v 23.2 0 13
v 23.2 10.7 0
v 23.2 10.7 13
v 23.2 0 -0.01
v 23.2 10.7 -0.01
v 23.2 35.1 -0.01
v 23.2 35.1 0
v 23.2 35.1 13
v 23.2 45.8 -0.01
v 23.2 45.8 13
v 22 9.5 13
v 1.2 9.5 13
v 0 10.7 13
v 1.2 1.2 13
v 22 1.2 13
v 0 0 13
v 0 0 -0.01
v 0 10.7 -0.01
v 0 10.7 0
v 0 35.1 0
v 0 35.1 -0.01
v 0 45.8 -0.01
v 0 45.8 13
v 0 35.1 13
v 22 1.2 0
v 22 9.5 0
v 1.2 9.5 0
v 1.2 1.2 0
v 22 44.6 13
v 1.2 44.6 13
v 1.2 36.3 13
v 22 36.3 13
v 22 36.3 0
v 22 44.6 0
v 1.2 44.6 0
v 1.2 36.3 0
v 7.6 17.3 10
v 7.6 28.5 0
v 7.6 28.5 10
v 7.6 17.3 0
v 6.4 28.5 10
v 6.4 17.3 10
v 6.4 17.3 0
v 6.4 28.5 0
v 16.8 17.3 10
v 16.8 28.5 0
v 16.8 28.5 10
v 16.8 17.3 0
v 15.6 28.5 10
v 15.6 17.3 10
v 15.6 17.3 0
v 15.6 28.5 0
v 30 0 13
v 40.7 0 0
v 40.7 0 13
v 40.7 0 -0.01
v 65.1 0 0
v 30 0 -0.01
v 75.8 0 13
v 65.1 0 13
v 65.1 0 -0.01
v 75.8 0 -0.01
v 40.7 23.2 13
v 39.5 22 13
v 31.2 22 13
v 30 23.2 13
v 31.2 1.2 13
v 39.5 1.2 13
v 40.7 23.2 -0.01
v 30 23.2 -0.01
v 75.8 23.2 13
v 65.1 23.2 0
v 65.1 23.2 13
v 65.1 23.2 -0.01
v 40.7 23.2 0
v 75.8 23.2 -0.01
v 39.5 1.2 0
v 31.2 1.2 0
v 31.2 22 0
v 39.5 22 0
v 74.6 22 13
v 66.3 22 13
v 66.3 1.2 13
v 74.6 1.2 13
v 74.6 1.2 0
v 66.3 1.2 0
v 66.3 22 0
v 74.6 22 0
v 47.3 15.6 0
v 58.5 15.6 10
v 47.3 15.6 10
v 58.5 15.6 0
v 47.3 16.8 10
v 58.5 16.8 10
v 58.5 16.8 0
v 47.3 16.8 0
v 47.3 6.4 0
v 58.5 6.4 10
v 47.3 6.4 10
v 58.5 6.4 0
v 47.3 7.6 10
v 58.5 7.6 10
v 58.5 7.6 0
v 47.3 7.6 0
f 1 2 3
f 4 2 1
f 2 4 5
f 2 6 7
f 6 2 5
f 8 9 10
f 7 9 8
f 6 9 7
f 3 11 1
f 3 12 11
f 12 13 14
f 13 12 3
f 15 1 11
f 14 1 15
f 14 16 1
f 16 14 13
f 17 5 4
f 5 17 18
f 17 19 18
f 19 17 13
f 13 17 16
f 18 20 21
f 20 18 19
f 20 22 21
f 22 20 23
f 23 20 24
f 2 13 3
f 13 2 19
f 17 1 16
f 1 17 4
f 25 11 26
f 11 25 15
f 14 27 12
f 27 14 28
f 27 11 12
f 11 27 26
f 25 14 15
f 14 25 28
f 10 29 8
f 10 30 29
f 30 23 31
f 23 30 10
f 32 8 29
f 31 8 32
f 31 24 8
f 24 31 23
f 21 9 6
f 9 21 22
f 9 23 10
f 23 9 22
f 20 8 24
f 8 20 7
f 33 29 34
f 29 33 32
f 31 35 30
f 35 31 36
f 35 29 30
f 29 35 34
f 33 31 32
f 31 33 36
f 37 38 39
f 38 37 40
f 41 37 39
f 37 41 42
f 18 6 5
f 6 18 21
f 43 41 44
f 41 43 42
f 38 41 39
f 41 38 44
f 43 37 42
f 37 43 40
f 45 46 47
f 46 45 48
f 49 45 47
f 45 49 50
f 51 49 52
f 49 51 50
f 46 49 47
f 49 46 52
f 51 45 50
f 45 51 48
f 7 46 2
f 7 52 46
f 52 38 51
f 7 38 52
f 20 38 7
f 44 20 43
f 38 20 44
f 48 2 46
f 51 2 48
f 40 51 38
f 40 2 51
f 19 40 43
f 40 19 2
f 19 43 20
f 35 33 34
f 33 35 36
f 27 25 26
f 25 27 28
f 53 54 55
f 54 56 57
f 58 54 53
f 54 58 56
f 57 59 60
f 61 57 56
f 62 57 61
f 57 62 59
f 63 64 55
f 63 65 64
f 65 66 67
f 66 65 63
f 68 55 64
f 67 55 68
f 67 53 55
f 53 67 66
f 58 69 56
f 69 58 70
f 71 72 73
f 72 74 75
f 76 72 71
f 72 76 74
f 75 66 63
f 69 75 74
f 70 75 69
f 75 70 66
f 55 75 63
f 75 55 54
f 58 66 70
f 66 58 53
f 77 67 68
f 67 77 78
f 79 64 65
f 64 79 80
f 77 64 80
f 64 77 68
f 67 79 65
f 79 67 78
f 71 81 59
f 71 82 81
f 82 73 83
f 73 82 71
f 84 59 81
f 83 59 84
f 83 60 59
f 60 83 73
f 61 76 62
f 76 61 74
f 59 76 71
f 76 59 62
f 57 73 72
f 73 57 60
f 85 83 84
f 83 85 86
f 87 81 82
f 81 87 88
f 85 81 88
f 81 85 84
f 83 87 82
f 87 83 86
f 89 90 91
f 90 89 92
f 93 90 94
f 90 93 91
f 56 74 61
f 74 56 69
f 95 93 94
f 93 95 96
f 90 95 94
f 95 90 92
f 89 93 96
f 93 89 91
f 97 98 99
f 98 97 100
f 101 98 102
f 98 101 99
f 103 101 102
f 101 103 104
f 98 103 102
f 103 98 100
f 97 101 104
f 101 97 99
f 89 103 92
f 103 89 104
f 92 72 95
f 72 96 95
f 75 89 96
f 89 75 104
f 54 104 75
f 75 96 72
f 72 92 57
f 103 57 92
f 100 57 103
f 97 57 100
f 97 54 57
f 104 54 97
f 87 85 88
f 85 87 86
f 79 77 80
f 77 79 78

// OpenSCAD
// file: ../../Elements/FrameLockingRing.scad
// Fischertechnik Box Library
// Frame for Locking Ring
// 31020

use <../Base/Constants.scad>
use <../ModelBase/Simple.scad>

width = 20;
depth = 7.5;
height = 13;

// getFrameLockingRingSpace(columns=1, rows=1)
// columns = Count of locking rings in X direction (width of ring)
// rows = Count of locking rings in Y direction (depth of ring)
// Gets the space the frame locking ring needs as width (.x and .y as a list)

function getFrameLockingRingSpace(columns=1, rows=1) = getFrameOuterVolume([width*columns, depth*rows, height]);

// FrameLockingRing(columns, rows, smallSideIsX)
// columns = Count of locking rings in X direction (width of ring)
// rows = Count of locking rings in Y direction (depth of ring)
// The walls of the frame are 13 mm high. The small side is 7.5 mm wide, the large side
// is 20 mm wide.

module FrameLockingRing(columns=1, rows=1) {
    Frame([width*columns, depth*rows, height]);
}

// Tests
color("lightgray")
    FrameLockingRing(1);
// file: ../../Elements/HolderWinchDrum.scad
// Fischertechnik Box Library
// Holder for Winch Drum
// 31016

use <../Base/Constants.scad>
use <../Base/Placement.scad>
use <../ModelBase/Simple.scad>

width = 20;
depth = 25;
height = 10;

// getWinchDrumHolderSpace()
// Gets the space the winch drum holder needs as width and depth (.x and .y as a list)

function getHolderWinchDrumSpace() = [width, depth, height];

// HolderWinchDrum()
// Two walls for holding the 31016 winch drum.

module HolderWinchDrum() {
    holderDepth = 11.2;
    holderDistance = 8;
    
    Space(getHolderWinchDrumSpace());
    
    module Holders() {
        Wall([getDividerThickness(), holderDepth, height]);
        translate([holderDistance + getDividerThickness(), 0])
            Wall([getDividerThickness(), holderDepth, height]);
    }
    
    Center(getHolderWinchDrumSpace(), [holderDistance + 2*getDividerThickness(), holderDepth]) {
        Holders();
    }
}

// Tests
color("lightgray")
HolderWinchDrum();
// file: ../../Base/Boxes.scad
// Fischertechnik Box Foundation
// Pre-designed Boxes

use <Constants.scad>

include <PlacementOptions.scad>

box190Width = 190;
box190Depth = 130;
box130Width = 130;
box130Depth = 95;

// Values are from an original ec3 box
topBottomDifference = 1.5;
outerHeight = 40;
innerHeight = 38.2;
baseThickness = outerHeight - innerHeight;
stackExcess = 5.7;
radius = 3.5;
wallThickness = 1.5;
tolerance = 0.2;
stackOffset = innerHeight - stackExcess;

boxUsageHeight = stackOffset;
boxWallThickness = wallThickness;
boxBaseThickness = baseThickness;
boxWebWidth = 3.0;

// getBoxWallThickness()
// Gets the wall thickness of a Fischertechnik Box
function getBoxWallThickness() = boxWallThickness;

// getBoxUsageHeight()
// Gets the usable height of a Fischertechnik box
function getBoxUsageHeight() = boxUsageHeight;

// getBoxInnerHeight()
// Gets the inner height of a Fischertechnik box, including the stack excess
function getBoxInnerHeight() = innerHeight;

// getBoxBaseThickness()
// Gets the thickness of the Fischertechnik box base.
function getBoxBaseThickness() = boxBaseThickness;

// getBoxWebWidth()
// Gets the width of a box web
function getBoxWebWidth() = boxWebWidth;

// getBox190Space()
// Gets the usable inner space of a Box 190 as an x/y-list
function getBox190Space() = [
    box190Width - 2*getBoxWallThickness() - topBottomDifference, 
    box190Depth - 2*getBoxWallThickness() - topBottomDifference ];

// BoxBase(width, depth)
// Creates an empty stackable Fischertechnik compatible box
// width = Outer width of the box (190, 130, ...)
// depth = Outer depth of the box (130, 95, ...)

module BoxBase(width, depth, height=outerHeight) {    
    thinPlate = 0.01;

    innerHeight = height - baseThickness;    
    
    module BodyPlate(width, depth) {
        translate([radius, radius])
        hull() {
            w = width-2*radius;
            d = depth-2*radius;
            cube([w, d, thinPlate]);
            cylinder(thinPlate, r=radius, $fn=getFragments());
            translate([w, 0])
                cylinder(thinPlate, r=radius, $fn=getFragments());
            translate([w, d])
                cylinder(thinPlate, r=radius, $fn=getFragments());
            translate([0, d])
                cylinder(thinPlate, r=radius, $fn=getFragments());
        }
    }
    
    module Body(tolerance=tolerance) {
        hull() {
            // Bottom with tolerance to fit into the original boxes when stacked
            translate([-wallThickness+tolerance, -wallThickness+tolerance, -baseThickness])
                BodyPlate(width-topBottomDifference-2*tolerance, depth-topBottomDifference-2*tolerance);
            
            // Top
            translate([-wallThickness-topBottomDifference/2, -wallThickness-topBottomDifference/2, innerHeight-thinPlate])
                BodyPlate(width, depth);
         }
    }

    module Cutoff() {
        hull() {
            coWidth = width - 2*wallThickness;
            coDepth = depth - 2*wallThickness;
            
            // Bottom
            BodyPlate(coWidth-topBottomDifference, coDepth-topBottomDifference);

            // Top
            translate([-topBottomDifference/2, -topBottomDifference/2, innerHeight+thinPlate]) 
                BodyPlate(coWidth, coDepth);
        }
    }
    
    difference() {        
        Body();
        Cutoff();
        stackOffset = innerHeight - stackExcess;
        translate([0, 0, stackOffset + baseThickness])
            Body(tolerance=0);
    }
}

// Creates the Fischertechnik empty box 130x190 mm and places it at position 0,0
// 190x130 are the outer sizes, the inner space is slightly smaller. Use getBox190Space() to get the inner sizes.
// The box is positioned that the usable inner space is at the 0,0,0 position. The

module Box190() {
    BoxBase(box190Width, box190Depth);
}

// Gets the usable inner space of a Box 130 as an x/y-list
function getBox130Space() = [
    box130Width - 2*getBoxWallThickness(), 
    box130Depth - 2*getBoxWallThickness() ];

// Creates the Fischertechnik empty box 95x130 mm and places it at position 0,0
// 190x130 are the outer sizes, the inner space is slightly smaller. Use getBox190Space() to get the inner sizes.
// The box is positioned that the usable inner space is at the 0,0,0 position. The

module Box130() {
    BoxBase(box130Width, box130Depth);
}

// Creates a web at the specified box walls
// corner 0 = LowerLeft, 1 = UpperLeft, 2 = UpperRight, 3 = LowerRight
// side 0 = LeftOfCorner, 1 = RightOfCorner
// distance = Distance in mm from the corner
// boxSpace = inner width and depth of the box (default: Box 190)
// webWidth = length of the web (default is 3 mms)
// webThickness = thickness of the web (default is 1 mm)

module BoxWeb(corner, side, distance, boxSpace=getBox190Space(), webWidth=getBoxWebWidth(), webThickness=1.0) {
    sink = getBoxWallThickness()/2;

    width = (corner % 2 == 0) ? 
            (side == LeftOfCorner ? webWidth : webThickness) :
            (side == LeftOfCorner ? webThickness : webWidth);

    depth = (corner % 2 == 0) ? 
            (side == RightOfCorner ? webWidth : webThickness) :
            (side == RightOfCorner ? webThickness : webWidth);
    
    xDiff = corner == LowerLeft ? 
                (side == LeftOfCorner ? -sink : distance) :
            (corner == UpperLeft ?                
                (side == LeftOfCorner ? distance : -sink) :
            (corner == UpperRight ?
                (side == LeftOfCorner ? boxSpace.x-webWidth+sink : boxSpace.x-distance-webThickness) :
                (side == LeftOfCorner ? boxSpace.x-distance-webThickness: boxSpace.x-webWidth+sink)));

    yDiff = corner == LowerLeft ? 
                (side == RightOfCorner ? -sink : distance) :
            (corner == UpperLeft ?
                (side == RightOfCorner ? boxSpace.y-distance : boxSpace.y-webWidth+sink) :
            (corner == UpperRight ?
                (side == RightOfCorner ? boxSpace.y-webWidth+sink : boxSpace.y-distance) :
                (side == RightOfCorner ? distance : -sink)));
    
    translate([xDiff, yDiff, -getExcess()])
        cube([width, depth, boxUsageHeight + 2*getExcess()]);
}
// file: ../../Base/Rotation.scad
// Fischertechnik Box Foundation
// Geometry Helpers Rotation

include <PlacementOptions.scad>

// getRotatedSpace(space, rotation=NoRotation)
// Rotates the space dependent on the specified rotation

function getRotatedSpace(space, rotation=NoRotation) = [
    (rotation == Rotate90 || rotation == Rotate270) ? space.y : space.x,
    (rotation == Rotate90 || rotation == Rotate270) ? space.x : space.y
];

// Rotates the given space around the fixed left lower corner
// space = the space the children needs as width/depth list [width,depth]
// rotation = 0 Rotate0 degrees, 1 Rotate90 degrees, 2 Rotate180 degrees, 3 Rotate270 degrees (equivalent to -90)

module RotateFix(space, rotation=NoRotation) {
    dy = (rotation == Rotate0 || rotation == Rotate270) ? 0 :
        (rotation == Rotate90) ? space.x :
        space.y;
    dx = (rotation < Rotate180) ? 0 :
        (rotation == Rotate180) ? space.x :
        space.y;
    
    translate([dx, dy, 0])
        rotate([0, 0, rotations[rotation]])
            children();
}
// file: ../../Base/Alignment.scad
// Fischertechnik Box Foundation
// Geometry Helpers Alignment

include <PlacementOptions.scad>

// getAlignedX(elementWidth, spaceWidth, align=AlignRight, offset=0)
// Gets the aligned X offset of an element with the given
// width in the given space.
// elementWidth = The width of the element to positon
// spaceWidth = The space where the element should be aligned
// align = 0 AlignLeft, 1 AlignCenter, 2 AlignRight
// offset = an optional offset from the aligned position. When
// aligned left or centered, then positive values are in X direction.
// When aligned right then positive values are in negative X direction.

function getAlignedX(elementWidth, spaceWidth, align=AlignRight, offset=0) =
    (align == AlignLeft) ?
        offset :
        ((align == AlignCenter) ?
        (spaceWidth - elementWidth)/2 + offset :
        spaceWidth - offset - elementWidth);

// getAlignedY(elementDepth, spaceDepth, align=AlignTop, offset=0)
// Gets the aligned Y offset of an element with the given
// depth in the given space.
// elementDepth = The depth of the element to positon
// spaceDepth = The space where the element should be aligned
// align = 0 AlignBottom, 1 AlignCenter, 2 AlignTop
// offset = an optional offset from the aligned position. When
// aligned bottom or centered, then positive values are in Y direction.
// When aligned top then positive values are in negative Y direction.

function getAlignedY(elementDepth, spaceDepth, align=AlignTop, offset=0) =
    (align == AlignBottom) ?
        offset :
        ((align == AlignCenter) ?
        (spaceDepth - elementDepth)/2 + offset :
        spaceDepth - offset - elementDepth);
// file: ../../Base/Constants.scad
// Fischertechnik Box Foundation
// Constants

// Constant values necessary for multiple elements

// Base constants
dividerThickness = 1.2;
excess = 0.01;
fragments = 90;
tolerance = 0.8;

// Gets the thickness of a divider 
function getDividerThickness() = dividerThickness;

// Gets the excess that is used to merge walls into each other
function getExcess() = excess;

// Gets amount of fragments of a cylinder
function getFragments() = fragments;

// Gets the inner tolerance of a frame to each side
function getTolerance() = tolerance;


// Fischertechnik specific constants
axisDiameter = 4;
axisBottomDiameter = axisDiameter + 1;
standardEdgeDistance = 2.5;
standardWebDistance = 11.5;
standardCornerLength = 15;
tubeWallFactor = 0.8;
smallPartsFrameHeight = 20;

// Gets axis diameter
function getAxisDiameter() = axisDiameter;

// Gets axis bottom diameter for thicker part at the bottom
function getAxisBottomDiameter() = axisBottomDiameter;

// gets the standard distance to the wall of the box for dockable frames with webs
function getStandardEdgeDistance() = standardEdgeDistance;

// gets the standard distance of each web to the corner of the dockable frame
function getStandardWebDistance() = standardWebDistance;

// gets the standard length of the corner walls of a dockable frame
function getStandardCornerLength() = standardCornerLength;

// gets the wall thickness of a tube.
function getTubeWallThickness() = tubeWallFactor * getDividerThickness();

// gets the frame height for docked small parts boxes.
function getSmallPartsFrameHeight() = smallPartsFrameHeight;
// file: ../../Base/PlacementOptions.scad
// Fischertechnik Box Foundation
// Placement Options

// Alignment
NoAlign = 0;
AlignLeft = 1;
AlignBottom = 2;
AlignCenter = 3;
AlignRight = 4;
AlignTop = 5;

// Element rotation degree steps
rotations = [0, -90, -180, -270];

// Rotation
NoRotation = 0;
Rotate0 = 0;
Rotate90 = 1;
Rotate180 = 2;
Rotate270 = 3;

// Docking (seen from above)
NoDock = -1;
DockLeft = 0;
DockTop = 1;
DockRight = 2;
DockCorner = 2;
DockBottom = 3;

// Web corners
LowerLeft = 0;
UpperLeft = 1;
UpperRight = 2;
LowerRight = 3;

// Web position relative to corner
LeftOfCorner = 0;
RightOfCorner = 1;
// file: ../../Elements/ComboHolderWinchDrumWithLockingRings.scad
// Fischertechnik Box Library
// Combo Winch Drum with Locking Rings
// 31016 + 2 x 31020

use <../ModelBase/Simple.scad>
use <HolderWinchDrum.scad>
use <FrameLockingRing.scad>

distance = 24.4;

// getComboHolderWinchDrumWithLockingRingsSpace()
// Gets the space the holder winch drum with locking rings needs as width (.x and .y as a list)

function getComboHolderWinchDrumWithLockingRingsSpace() = [
    getFrameLockingRingSpace().x, 
    getFrameLockingRingSpace().y * 2 + distance,
    getFrameLockingRingSpace().z];

// ComboHolderWinchDrumWithLockingRings
// Combination of a winch drum holder with two locking ring holders at both ends

module ComboHolderWinchDrumWithLockingRings() {    
    yOffsetFrame = distance + getFrameLockingRingSpace()[1];
    
    Space(getComboHolderWinchDrumWithLockingRingsSpace());
    
    FrameLockingRing();
    translate([0, yOffsetFrame, 0])
        FrameLockingRing();
    
    xOffset = (getFrameLockingRingSpace()[0] - getHolderWinchDrumSpace()[0]) / 2;
    yOffset = (distance + 2 * getFrameLockingRingSpace()[1] - getHolderWinchDrumSpace()[1]) / 2;
    
    translate([xOffset, yOffset, 0])
        HolderWinchDrum();
}

// Tests
color("lightgray")
ComboHolderWinchDrumWithLockingRings();
// file: ../../Base/Placement.scad
// Fischertechnik Box Foundation
// Geometry Helpers Placement

use <Constants.scad>
use <Alignment.scad>
use <Rotation.scad>
use <Boxes.scad>

include <PlacementOptions.scad>

// Place(x=0, y=0, elementSpace=[0,0], alignX=AlignLeft, alignY=AlignBottom, rotation=Rotate0, boxSpace=getBox190Space())
// Places the child at the specified position
// y = Y-Position. This is a relative position when an X aligment is specified.
// x = X-Position. This is a relative position when an Y aligment is specified.
// elementSpace = space of the element to be placed [x,y]
// alignX = -1=NoAlign, 0 AlignLeft, 1 AlignCenter, 3 AlignRight (elementSpace and boxSpace required!)
// alignY = -1=NoAlign, 2 AlignBottom, 1 AlignCenter, 4 AlignTop (elementSpace and boxSpace required!)
// rotation = 0 Rotate0 0 degrees, 1 Rotate90 90 degrees, 
// 2 Rotate180 180 degrees, 3 Rotate270 270 degrees (equivalent to -90)
// boxSpace = Inner space of the box where the placement occurs [x,y] - default is Box 190x130 inner space

module Place(x=0, y=0, elementSpace=[0,0], 
  alignX=AlignLeft, alignY=AlignBottom, 
  rotation=NoRotation, boxSpace=getBox190Space()) {

    module Position(x, y, space, rotation=Rotate0) {
        translate([x, y, 0])
            RotateFix(space, rotation)
                children();
    }

    space = getRotatedSpace(elementSpace, rotation);
    alignedX = getAlignedX(space.x, boxSpace.x, alignX, x);
    alignedY = getAlignedY(space.y, boxSpace.y, alignY, y);
    Position(alignedX, alignedY, elementSpace, rotation)
        children();
}

// Center(space=getBox130Space(), elementSpace=[0,0])
// space = Space where the children is centered. For cylinder use centered=true and no elementSpace.
// elementSpace = space of the element to be centered [x,y]

module Center(space=getBox190Space(), elementSpace=[0,0]) {
    Place(elementSpace=elementSpace, boxSpace=space, alignX=AlignCenter, alignY=AlignCenter)
        children();
}

// CenterHorizontal(width=0, y=0, offset=0, space=getBox130Space())
// width = Width of the element to be placed.
// y = Y position of the element
// offset = Offset from the center position (negative will be left of the center)
// space = Space where the element is placed

module CenterHorizontal(width=0, y=0, offset=0, space=getBox190Space()) {
    Place(x=offset, y=y, elementSpace=[width, 0], boxSpace=space, alignX=AlignCenter)
        children(0);
}

// CenterVertical(depth=0, x=0, offset=0, space=getBox130Space())
// depth = Depth of the element to be placed.
// x = X position of the element
// offset = Offset from the center position (negative will be down of the center)
// space = Space where the element is placed

module CenterVertical(depth=0, x=0, offset=0, space=getBox190Space()) {
    Place(x=x, y=offset, elementSpace=[0, depth], boxSpace=space, alignY=AlignCenter)
        children(0);
}

// getIsVertical(align)
// True if the specified alignment needs a vertical orientation for a divider (AlignRight, AlignLeft)

function getIsVertical(align) = (align == AlignRight || align == AlignLeft);

// getIsHorizontal(align)
// True if the specified alignment needs a horizontal orientation for a divider (AlignTop, AlignBottom)

function getIsHorizontal(align) = (align == AlignTop || align == AlignBottom);
// main file
// Fischertechnik Box Foundation
// Elements
// Test ComboHolderWinchDrumWithLockingRings

use <../../Base/Placement.scad>
use <../../Elements/ComboHolderWinchDrumWithLockingRings.scad>

include <../../Base/PlacementOptions.scad>

ComboHolderWinchDrumWithLockingRings();

Place(30, 0, elementSpace=getComboHolderWinchDrumWithLockingRingsSpace(), rotation=Rotate90)
    ComboHolderWinchDrumWithLockingRings();
